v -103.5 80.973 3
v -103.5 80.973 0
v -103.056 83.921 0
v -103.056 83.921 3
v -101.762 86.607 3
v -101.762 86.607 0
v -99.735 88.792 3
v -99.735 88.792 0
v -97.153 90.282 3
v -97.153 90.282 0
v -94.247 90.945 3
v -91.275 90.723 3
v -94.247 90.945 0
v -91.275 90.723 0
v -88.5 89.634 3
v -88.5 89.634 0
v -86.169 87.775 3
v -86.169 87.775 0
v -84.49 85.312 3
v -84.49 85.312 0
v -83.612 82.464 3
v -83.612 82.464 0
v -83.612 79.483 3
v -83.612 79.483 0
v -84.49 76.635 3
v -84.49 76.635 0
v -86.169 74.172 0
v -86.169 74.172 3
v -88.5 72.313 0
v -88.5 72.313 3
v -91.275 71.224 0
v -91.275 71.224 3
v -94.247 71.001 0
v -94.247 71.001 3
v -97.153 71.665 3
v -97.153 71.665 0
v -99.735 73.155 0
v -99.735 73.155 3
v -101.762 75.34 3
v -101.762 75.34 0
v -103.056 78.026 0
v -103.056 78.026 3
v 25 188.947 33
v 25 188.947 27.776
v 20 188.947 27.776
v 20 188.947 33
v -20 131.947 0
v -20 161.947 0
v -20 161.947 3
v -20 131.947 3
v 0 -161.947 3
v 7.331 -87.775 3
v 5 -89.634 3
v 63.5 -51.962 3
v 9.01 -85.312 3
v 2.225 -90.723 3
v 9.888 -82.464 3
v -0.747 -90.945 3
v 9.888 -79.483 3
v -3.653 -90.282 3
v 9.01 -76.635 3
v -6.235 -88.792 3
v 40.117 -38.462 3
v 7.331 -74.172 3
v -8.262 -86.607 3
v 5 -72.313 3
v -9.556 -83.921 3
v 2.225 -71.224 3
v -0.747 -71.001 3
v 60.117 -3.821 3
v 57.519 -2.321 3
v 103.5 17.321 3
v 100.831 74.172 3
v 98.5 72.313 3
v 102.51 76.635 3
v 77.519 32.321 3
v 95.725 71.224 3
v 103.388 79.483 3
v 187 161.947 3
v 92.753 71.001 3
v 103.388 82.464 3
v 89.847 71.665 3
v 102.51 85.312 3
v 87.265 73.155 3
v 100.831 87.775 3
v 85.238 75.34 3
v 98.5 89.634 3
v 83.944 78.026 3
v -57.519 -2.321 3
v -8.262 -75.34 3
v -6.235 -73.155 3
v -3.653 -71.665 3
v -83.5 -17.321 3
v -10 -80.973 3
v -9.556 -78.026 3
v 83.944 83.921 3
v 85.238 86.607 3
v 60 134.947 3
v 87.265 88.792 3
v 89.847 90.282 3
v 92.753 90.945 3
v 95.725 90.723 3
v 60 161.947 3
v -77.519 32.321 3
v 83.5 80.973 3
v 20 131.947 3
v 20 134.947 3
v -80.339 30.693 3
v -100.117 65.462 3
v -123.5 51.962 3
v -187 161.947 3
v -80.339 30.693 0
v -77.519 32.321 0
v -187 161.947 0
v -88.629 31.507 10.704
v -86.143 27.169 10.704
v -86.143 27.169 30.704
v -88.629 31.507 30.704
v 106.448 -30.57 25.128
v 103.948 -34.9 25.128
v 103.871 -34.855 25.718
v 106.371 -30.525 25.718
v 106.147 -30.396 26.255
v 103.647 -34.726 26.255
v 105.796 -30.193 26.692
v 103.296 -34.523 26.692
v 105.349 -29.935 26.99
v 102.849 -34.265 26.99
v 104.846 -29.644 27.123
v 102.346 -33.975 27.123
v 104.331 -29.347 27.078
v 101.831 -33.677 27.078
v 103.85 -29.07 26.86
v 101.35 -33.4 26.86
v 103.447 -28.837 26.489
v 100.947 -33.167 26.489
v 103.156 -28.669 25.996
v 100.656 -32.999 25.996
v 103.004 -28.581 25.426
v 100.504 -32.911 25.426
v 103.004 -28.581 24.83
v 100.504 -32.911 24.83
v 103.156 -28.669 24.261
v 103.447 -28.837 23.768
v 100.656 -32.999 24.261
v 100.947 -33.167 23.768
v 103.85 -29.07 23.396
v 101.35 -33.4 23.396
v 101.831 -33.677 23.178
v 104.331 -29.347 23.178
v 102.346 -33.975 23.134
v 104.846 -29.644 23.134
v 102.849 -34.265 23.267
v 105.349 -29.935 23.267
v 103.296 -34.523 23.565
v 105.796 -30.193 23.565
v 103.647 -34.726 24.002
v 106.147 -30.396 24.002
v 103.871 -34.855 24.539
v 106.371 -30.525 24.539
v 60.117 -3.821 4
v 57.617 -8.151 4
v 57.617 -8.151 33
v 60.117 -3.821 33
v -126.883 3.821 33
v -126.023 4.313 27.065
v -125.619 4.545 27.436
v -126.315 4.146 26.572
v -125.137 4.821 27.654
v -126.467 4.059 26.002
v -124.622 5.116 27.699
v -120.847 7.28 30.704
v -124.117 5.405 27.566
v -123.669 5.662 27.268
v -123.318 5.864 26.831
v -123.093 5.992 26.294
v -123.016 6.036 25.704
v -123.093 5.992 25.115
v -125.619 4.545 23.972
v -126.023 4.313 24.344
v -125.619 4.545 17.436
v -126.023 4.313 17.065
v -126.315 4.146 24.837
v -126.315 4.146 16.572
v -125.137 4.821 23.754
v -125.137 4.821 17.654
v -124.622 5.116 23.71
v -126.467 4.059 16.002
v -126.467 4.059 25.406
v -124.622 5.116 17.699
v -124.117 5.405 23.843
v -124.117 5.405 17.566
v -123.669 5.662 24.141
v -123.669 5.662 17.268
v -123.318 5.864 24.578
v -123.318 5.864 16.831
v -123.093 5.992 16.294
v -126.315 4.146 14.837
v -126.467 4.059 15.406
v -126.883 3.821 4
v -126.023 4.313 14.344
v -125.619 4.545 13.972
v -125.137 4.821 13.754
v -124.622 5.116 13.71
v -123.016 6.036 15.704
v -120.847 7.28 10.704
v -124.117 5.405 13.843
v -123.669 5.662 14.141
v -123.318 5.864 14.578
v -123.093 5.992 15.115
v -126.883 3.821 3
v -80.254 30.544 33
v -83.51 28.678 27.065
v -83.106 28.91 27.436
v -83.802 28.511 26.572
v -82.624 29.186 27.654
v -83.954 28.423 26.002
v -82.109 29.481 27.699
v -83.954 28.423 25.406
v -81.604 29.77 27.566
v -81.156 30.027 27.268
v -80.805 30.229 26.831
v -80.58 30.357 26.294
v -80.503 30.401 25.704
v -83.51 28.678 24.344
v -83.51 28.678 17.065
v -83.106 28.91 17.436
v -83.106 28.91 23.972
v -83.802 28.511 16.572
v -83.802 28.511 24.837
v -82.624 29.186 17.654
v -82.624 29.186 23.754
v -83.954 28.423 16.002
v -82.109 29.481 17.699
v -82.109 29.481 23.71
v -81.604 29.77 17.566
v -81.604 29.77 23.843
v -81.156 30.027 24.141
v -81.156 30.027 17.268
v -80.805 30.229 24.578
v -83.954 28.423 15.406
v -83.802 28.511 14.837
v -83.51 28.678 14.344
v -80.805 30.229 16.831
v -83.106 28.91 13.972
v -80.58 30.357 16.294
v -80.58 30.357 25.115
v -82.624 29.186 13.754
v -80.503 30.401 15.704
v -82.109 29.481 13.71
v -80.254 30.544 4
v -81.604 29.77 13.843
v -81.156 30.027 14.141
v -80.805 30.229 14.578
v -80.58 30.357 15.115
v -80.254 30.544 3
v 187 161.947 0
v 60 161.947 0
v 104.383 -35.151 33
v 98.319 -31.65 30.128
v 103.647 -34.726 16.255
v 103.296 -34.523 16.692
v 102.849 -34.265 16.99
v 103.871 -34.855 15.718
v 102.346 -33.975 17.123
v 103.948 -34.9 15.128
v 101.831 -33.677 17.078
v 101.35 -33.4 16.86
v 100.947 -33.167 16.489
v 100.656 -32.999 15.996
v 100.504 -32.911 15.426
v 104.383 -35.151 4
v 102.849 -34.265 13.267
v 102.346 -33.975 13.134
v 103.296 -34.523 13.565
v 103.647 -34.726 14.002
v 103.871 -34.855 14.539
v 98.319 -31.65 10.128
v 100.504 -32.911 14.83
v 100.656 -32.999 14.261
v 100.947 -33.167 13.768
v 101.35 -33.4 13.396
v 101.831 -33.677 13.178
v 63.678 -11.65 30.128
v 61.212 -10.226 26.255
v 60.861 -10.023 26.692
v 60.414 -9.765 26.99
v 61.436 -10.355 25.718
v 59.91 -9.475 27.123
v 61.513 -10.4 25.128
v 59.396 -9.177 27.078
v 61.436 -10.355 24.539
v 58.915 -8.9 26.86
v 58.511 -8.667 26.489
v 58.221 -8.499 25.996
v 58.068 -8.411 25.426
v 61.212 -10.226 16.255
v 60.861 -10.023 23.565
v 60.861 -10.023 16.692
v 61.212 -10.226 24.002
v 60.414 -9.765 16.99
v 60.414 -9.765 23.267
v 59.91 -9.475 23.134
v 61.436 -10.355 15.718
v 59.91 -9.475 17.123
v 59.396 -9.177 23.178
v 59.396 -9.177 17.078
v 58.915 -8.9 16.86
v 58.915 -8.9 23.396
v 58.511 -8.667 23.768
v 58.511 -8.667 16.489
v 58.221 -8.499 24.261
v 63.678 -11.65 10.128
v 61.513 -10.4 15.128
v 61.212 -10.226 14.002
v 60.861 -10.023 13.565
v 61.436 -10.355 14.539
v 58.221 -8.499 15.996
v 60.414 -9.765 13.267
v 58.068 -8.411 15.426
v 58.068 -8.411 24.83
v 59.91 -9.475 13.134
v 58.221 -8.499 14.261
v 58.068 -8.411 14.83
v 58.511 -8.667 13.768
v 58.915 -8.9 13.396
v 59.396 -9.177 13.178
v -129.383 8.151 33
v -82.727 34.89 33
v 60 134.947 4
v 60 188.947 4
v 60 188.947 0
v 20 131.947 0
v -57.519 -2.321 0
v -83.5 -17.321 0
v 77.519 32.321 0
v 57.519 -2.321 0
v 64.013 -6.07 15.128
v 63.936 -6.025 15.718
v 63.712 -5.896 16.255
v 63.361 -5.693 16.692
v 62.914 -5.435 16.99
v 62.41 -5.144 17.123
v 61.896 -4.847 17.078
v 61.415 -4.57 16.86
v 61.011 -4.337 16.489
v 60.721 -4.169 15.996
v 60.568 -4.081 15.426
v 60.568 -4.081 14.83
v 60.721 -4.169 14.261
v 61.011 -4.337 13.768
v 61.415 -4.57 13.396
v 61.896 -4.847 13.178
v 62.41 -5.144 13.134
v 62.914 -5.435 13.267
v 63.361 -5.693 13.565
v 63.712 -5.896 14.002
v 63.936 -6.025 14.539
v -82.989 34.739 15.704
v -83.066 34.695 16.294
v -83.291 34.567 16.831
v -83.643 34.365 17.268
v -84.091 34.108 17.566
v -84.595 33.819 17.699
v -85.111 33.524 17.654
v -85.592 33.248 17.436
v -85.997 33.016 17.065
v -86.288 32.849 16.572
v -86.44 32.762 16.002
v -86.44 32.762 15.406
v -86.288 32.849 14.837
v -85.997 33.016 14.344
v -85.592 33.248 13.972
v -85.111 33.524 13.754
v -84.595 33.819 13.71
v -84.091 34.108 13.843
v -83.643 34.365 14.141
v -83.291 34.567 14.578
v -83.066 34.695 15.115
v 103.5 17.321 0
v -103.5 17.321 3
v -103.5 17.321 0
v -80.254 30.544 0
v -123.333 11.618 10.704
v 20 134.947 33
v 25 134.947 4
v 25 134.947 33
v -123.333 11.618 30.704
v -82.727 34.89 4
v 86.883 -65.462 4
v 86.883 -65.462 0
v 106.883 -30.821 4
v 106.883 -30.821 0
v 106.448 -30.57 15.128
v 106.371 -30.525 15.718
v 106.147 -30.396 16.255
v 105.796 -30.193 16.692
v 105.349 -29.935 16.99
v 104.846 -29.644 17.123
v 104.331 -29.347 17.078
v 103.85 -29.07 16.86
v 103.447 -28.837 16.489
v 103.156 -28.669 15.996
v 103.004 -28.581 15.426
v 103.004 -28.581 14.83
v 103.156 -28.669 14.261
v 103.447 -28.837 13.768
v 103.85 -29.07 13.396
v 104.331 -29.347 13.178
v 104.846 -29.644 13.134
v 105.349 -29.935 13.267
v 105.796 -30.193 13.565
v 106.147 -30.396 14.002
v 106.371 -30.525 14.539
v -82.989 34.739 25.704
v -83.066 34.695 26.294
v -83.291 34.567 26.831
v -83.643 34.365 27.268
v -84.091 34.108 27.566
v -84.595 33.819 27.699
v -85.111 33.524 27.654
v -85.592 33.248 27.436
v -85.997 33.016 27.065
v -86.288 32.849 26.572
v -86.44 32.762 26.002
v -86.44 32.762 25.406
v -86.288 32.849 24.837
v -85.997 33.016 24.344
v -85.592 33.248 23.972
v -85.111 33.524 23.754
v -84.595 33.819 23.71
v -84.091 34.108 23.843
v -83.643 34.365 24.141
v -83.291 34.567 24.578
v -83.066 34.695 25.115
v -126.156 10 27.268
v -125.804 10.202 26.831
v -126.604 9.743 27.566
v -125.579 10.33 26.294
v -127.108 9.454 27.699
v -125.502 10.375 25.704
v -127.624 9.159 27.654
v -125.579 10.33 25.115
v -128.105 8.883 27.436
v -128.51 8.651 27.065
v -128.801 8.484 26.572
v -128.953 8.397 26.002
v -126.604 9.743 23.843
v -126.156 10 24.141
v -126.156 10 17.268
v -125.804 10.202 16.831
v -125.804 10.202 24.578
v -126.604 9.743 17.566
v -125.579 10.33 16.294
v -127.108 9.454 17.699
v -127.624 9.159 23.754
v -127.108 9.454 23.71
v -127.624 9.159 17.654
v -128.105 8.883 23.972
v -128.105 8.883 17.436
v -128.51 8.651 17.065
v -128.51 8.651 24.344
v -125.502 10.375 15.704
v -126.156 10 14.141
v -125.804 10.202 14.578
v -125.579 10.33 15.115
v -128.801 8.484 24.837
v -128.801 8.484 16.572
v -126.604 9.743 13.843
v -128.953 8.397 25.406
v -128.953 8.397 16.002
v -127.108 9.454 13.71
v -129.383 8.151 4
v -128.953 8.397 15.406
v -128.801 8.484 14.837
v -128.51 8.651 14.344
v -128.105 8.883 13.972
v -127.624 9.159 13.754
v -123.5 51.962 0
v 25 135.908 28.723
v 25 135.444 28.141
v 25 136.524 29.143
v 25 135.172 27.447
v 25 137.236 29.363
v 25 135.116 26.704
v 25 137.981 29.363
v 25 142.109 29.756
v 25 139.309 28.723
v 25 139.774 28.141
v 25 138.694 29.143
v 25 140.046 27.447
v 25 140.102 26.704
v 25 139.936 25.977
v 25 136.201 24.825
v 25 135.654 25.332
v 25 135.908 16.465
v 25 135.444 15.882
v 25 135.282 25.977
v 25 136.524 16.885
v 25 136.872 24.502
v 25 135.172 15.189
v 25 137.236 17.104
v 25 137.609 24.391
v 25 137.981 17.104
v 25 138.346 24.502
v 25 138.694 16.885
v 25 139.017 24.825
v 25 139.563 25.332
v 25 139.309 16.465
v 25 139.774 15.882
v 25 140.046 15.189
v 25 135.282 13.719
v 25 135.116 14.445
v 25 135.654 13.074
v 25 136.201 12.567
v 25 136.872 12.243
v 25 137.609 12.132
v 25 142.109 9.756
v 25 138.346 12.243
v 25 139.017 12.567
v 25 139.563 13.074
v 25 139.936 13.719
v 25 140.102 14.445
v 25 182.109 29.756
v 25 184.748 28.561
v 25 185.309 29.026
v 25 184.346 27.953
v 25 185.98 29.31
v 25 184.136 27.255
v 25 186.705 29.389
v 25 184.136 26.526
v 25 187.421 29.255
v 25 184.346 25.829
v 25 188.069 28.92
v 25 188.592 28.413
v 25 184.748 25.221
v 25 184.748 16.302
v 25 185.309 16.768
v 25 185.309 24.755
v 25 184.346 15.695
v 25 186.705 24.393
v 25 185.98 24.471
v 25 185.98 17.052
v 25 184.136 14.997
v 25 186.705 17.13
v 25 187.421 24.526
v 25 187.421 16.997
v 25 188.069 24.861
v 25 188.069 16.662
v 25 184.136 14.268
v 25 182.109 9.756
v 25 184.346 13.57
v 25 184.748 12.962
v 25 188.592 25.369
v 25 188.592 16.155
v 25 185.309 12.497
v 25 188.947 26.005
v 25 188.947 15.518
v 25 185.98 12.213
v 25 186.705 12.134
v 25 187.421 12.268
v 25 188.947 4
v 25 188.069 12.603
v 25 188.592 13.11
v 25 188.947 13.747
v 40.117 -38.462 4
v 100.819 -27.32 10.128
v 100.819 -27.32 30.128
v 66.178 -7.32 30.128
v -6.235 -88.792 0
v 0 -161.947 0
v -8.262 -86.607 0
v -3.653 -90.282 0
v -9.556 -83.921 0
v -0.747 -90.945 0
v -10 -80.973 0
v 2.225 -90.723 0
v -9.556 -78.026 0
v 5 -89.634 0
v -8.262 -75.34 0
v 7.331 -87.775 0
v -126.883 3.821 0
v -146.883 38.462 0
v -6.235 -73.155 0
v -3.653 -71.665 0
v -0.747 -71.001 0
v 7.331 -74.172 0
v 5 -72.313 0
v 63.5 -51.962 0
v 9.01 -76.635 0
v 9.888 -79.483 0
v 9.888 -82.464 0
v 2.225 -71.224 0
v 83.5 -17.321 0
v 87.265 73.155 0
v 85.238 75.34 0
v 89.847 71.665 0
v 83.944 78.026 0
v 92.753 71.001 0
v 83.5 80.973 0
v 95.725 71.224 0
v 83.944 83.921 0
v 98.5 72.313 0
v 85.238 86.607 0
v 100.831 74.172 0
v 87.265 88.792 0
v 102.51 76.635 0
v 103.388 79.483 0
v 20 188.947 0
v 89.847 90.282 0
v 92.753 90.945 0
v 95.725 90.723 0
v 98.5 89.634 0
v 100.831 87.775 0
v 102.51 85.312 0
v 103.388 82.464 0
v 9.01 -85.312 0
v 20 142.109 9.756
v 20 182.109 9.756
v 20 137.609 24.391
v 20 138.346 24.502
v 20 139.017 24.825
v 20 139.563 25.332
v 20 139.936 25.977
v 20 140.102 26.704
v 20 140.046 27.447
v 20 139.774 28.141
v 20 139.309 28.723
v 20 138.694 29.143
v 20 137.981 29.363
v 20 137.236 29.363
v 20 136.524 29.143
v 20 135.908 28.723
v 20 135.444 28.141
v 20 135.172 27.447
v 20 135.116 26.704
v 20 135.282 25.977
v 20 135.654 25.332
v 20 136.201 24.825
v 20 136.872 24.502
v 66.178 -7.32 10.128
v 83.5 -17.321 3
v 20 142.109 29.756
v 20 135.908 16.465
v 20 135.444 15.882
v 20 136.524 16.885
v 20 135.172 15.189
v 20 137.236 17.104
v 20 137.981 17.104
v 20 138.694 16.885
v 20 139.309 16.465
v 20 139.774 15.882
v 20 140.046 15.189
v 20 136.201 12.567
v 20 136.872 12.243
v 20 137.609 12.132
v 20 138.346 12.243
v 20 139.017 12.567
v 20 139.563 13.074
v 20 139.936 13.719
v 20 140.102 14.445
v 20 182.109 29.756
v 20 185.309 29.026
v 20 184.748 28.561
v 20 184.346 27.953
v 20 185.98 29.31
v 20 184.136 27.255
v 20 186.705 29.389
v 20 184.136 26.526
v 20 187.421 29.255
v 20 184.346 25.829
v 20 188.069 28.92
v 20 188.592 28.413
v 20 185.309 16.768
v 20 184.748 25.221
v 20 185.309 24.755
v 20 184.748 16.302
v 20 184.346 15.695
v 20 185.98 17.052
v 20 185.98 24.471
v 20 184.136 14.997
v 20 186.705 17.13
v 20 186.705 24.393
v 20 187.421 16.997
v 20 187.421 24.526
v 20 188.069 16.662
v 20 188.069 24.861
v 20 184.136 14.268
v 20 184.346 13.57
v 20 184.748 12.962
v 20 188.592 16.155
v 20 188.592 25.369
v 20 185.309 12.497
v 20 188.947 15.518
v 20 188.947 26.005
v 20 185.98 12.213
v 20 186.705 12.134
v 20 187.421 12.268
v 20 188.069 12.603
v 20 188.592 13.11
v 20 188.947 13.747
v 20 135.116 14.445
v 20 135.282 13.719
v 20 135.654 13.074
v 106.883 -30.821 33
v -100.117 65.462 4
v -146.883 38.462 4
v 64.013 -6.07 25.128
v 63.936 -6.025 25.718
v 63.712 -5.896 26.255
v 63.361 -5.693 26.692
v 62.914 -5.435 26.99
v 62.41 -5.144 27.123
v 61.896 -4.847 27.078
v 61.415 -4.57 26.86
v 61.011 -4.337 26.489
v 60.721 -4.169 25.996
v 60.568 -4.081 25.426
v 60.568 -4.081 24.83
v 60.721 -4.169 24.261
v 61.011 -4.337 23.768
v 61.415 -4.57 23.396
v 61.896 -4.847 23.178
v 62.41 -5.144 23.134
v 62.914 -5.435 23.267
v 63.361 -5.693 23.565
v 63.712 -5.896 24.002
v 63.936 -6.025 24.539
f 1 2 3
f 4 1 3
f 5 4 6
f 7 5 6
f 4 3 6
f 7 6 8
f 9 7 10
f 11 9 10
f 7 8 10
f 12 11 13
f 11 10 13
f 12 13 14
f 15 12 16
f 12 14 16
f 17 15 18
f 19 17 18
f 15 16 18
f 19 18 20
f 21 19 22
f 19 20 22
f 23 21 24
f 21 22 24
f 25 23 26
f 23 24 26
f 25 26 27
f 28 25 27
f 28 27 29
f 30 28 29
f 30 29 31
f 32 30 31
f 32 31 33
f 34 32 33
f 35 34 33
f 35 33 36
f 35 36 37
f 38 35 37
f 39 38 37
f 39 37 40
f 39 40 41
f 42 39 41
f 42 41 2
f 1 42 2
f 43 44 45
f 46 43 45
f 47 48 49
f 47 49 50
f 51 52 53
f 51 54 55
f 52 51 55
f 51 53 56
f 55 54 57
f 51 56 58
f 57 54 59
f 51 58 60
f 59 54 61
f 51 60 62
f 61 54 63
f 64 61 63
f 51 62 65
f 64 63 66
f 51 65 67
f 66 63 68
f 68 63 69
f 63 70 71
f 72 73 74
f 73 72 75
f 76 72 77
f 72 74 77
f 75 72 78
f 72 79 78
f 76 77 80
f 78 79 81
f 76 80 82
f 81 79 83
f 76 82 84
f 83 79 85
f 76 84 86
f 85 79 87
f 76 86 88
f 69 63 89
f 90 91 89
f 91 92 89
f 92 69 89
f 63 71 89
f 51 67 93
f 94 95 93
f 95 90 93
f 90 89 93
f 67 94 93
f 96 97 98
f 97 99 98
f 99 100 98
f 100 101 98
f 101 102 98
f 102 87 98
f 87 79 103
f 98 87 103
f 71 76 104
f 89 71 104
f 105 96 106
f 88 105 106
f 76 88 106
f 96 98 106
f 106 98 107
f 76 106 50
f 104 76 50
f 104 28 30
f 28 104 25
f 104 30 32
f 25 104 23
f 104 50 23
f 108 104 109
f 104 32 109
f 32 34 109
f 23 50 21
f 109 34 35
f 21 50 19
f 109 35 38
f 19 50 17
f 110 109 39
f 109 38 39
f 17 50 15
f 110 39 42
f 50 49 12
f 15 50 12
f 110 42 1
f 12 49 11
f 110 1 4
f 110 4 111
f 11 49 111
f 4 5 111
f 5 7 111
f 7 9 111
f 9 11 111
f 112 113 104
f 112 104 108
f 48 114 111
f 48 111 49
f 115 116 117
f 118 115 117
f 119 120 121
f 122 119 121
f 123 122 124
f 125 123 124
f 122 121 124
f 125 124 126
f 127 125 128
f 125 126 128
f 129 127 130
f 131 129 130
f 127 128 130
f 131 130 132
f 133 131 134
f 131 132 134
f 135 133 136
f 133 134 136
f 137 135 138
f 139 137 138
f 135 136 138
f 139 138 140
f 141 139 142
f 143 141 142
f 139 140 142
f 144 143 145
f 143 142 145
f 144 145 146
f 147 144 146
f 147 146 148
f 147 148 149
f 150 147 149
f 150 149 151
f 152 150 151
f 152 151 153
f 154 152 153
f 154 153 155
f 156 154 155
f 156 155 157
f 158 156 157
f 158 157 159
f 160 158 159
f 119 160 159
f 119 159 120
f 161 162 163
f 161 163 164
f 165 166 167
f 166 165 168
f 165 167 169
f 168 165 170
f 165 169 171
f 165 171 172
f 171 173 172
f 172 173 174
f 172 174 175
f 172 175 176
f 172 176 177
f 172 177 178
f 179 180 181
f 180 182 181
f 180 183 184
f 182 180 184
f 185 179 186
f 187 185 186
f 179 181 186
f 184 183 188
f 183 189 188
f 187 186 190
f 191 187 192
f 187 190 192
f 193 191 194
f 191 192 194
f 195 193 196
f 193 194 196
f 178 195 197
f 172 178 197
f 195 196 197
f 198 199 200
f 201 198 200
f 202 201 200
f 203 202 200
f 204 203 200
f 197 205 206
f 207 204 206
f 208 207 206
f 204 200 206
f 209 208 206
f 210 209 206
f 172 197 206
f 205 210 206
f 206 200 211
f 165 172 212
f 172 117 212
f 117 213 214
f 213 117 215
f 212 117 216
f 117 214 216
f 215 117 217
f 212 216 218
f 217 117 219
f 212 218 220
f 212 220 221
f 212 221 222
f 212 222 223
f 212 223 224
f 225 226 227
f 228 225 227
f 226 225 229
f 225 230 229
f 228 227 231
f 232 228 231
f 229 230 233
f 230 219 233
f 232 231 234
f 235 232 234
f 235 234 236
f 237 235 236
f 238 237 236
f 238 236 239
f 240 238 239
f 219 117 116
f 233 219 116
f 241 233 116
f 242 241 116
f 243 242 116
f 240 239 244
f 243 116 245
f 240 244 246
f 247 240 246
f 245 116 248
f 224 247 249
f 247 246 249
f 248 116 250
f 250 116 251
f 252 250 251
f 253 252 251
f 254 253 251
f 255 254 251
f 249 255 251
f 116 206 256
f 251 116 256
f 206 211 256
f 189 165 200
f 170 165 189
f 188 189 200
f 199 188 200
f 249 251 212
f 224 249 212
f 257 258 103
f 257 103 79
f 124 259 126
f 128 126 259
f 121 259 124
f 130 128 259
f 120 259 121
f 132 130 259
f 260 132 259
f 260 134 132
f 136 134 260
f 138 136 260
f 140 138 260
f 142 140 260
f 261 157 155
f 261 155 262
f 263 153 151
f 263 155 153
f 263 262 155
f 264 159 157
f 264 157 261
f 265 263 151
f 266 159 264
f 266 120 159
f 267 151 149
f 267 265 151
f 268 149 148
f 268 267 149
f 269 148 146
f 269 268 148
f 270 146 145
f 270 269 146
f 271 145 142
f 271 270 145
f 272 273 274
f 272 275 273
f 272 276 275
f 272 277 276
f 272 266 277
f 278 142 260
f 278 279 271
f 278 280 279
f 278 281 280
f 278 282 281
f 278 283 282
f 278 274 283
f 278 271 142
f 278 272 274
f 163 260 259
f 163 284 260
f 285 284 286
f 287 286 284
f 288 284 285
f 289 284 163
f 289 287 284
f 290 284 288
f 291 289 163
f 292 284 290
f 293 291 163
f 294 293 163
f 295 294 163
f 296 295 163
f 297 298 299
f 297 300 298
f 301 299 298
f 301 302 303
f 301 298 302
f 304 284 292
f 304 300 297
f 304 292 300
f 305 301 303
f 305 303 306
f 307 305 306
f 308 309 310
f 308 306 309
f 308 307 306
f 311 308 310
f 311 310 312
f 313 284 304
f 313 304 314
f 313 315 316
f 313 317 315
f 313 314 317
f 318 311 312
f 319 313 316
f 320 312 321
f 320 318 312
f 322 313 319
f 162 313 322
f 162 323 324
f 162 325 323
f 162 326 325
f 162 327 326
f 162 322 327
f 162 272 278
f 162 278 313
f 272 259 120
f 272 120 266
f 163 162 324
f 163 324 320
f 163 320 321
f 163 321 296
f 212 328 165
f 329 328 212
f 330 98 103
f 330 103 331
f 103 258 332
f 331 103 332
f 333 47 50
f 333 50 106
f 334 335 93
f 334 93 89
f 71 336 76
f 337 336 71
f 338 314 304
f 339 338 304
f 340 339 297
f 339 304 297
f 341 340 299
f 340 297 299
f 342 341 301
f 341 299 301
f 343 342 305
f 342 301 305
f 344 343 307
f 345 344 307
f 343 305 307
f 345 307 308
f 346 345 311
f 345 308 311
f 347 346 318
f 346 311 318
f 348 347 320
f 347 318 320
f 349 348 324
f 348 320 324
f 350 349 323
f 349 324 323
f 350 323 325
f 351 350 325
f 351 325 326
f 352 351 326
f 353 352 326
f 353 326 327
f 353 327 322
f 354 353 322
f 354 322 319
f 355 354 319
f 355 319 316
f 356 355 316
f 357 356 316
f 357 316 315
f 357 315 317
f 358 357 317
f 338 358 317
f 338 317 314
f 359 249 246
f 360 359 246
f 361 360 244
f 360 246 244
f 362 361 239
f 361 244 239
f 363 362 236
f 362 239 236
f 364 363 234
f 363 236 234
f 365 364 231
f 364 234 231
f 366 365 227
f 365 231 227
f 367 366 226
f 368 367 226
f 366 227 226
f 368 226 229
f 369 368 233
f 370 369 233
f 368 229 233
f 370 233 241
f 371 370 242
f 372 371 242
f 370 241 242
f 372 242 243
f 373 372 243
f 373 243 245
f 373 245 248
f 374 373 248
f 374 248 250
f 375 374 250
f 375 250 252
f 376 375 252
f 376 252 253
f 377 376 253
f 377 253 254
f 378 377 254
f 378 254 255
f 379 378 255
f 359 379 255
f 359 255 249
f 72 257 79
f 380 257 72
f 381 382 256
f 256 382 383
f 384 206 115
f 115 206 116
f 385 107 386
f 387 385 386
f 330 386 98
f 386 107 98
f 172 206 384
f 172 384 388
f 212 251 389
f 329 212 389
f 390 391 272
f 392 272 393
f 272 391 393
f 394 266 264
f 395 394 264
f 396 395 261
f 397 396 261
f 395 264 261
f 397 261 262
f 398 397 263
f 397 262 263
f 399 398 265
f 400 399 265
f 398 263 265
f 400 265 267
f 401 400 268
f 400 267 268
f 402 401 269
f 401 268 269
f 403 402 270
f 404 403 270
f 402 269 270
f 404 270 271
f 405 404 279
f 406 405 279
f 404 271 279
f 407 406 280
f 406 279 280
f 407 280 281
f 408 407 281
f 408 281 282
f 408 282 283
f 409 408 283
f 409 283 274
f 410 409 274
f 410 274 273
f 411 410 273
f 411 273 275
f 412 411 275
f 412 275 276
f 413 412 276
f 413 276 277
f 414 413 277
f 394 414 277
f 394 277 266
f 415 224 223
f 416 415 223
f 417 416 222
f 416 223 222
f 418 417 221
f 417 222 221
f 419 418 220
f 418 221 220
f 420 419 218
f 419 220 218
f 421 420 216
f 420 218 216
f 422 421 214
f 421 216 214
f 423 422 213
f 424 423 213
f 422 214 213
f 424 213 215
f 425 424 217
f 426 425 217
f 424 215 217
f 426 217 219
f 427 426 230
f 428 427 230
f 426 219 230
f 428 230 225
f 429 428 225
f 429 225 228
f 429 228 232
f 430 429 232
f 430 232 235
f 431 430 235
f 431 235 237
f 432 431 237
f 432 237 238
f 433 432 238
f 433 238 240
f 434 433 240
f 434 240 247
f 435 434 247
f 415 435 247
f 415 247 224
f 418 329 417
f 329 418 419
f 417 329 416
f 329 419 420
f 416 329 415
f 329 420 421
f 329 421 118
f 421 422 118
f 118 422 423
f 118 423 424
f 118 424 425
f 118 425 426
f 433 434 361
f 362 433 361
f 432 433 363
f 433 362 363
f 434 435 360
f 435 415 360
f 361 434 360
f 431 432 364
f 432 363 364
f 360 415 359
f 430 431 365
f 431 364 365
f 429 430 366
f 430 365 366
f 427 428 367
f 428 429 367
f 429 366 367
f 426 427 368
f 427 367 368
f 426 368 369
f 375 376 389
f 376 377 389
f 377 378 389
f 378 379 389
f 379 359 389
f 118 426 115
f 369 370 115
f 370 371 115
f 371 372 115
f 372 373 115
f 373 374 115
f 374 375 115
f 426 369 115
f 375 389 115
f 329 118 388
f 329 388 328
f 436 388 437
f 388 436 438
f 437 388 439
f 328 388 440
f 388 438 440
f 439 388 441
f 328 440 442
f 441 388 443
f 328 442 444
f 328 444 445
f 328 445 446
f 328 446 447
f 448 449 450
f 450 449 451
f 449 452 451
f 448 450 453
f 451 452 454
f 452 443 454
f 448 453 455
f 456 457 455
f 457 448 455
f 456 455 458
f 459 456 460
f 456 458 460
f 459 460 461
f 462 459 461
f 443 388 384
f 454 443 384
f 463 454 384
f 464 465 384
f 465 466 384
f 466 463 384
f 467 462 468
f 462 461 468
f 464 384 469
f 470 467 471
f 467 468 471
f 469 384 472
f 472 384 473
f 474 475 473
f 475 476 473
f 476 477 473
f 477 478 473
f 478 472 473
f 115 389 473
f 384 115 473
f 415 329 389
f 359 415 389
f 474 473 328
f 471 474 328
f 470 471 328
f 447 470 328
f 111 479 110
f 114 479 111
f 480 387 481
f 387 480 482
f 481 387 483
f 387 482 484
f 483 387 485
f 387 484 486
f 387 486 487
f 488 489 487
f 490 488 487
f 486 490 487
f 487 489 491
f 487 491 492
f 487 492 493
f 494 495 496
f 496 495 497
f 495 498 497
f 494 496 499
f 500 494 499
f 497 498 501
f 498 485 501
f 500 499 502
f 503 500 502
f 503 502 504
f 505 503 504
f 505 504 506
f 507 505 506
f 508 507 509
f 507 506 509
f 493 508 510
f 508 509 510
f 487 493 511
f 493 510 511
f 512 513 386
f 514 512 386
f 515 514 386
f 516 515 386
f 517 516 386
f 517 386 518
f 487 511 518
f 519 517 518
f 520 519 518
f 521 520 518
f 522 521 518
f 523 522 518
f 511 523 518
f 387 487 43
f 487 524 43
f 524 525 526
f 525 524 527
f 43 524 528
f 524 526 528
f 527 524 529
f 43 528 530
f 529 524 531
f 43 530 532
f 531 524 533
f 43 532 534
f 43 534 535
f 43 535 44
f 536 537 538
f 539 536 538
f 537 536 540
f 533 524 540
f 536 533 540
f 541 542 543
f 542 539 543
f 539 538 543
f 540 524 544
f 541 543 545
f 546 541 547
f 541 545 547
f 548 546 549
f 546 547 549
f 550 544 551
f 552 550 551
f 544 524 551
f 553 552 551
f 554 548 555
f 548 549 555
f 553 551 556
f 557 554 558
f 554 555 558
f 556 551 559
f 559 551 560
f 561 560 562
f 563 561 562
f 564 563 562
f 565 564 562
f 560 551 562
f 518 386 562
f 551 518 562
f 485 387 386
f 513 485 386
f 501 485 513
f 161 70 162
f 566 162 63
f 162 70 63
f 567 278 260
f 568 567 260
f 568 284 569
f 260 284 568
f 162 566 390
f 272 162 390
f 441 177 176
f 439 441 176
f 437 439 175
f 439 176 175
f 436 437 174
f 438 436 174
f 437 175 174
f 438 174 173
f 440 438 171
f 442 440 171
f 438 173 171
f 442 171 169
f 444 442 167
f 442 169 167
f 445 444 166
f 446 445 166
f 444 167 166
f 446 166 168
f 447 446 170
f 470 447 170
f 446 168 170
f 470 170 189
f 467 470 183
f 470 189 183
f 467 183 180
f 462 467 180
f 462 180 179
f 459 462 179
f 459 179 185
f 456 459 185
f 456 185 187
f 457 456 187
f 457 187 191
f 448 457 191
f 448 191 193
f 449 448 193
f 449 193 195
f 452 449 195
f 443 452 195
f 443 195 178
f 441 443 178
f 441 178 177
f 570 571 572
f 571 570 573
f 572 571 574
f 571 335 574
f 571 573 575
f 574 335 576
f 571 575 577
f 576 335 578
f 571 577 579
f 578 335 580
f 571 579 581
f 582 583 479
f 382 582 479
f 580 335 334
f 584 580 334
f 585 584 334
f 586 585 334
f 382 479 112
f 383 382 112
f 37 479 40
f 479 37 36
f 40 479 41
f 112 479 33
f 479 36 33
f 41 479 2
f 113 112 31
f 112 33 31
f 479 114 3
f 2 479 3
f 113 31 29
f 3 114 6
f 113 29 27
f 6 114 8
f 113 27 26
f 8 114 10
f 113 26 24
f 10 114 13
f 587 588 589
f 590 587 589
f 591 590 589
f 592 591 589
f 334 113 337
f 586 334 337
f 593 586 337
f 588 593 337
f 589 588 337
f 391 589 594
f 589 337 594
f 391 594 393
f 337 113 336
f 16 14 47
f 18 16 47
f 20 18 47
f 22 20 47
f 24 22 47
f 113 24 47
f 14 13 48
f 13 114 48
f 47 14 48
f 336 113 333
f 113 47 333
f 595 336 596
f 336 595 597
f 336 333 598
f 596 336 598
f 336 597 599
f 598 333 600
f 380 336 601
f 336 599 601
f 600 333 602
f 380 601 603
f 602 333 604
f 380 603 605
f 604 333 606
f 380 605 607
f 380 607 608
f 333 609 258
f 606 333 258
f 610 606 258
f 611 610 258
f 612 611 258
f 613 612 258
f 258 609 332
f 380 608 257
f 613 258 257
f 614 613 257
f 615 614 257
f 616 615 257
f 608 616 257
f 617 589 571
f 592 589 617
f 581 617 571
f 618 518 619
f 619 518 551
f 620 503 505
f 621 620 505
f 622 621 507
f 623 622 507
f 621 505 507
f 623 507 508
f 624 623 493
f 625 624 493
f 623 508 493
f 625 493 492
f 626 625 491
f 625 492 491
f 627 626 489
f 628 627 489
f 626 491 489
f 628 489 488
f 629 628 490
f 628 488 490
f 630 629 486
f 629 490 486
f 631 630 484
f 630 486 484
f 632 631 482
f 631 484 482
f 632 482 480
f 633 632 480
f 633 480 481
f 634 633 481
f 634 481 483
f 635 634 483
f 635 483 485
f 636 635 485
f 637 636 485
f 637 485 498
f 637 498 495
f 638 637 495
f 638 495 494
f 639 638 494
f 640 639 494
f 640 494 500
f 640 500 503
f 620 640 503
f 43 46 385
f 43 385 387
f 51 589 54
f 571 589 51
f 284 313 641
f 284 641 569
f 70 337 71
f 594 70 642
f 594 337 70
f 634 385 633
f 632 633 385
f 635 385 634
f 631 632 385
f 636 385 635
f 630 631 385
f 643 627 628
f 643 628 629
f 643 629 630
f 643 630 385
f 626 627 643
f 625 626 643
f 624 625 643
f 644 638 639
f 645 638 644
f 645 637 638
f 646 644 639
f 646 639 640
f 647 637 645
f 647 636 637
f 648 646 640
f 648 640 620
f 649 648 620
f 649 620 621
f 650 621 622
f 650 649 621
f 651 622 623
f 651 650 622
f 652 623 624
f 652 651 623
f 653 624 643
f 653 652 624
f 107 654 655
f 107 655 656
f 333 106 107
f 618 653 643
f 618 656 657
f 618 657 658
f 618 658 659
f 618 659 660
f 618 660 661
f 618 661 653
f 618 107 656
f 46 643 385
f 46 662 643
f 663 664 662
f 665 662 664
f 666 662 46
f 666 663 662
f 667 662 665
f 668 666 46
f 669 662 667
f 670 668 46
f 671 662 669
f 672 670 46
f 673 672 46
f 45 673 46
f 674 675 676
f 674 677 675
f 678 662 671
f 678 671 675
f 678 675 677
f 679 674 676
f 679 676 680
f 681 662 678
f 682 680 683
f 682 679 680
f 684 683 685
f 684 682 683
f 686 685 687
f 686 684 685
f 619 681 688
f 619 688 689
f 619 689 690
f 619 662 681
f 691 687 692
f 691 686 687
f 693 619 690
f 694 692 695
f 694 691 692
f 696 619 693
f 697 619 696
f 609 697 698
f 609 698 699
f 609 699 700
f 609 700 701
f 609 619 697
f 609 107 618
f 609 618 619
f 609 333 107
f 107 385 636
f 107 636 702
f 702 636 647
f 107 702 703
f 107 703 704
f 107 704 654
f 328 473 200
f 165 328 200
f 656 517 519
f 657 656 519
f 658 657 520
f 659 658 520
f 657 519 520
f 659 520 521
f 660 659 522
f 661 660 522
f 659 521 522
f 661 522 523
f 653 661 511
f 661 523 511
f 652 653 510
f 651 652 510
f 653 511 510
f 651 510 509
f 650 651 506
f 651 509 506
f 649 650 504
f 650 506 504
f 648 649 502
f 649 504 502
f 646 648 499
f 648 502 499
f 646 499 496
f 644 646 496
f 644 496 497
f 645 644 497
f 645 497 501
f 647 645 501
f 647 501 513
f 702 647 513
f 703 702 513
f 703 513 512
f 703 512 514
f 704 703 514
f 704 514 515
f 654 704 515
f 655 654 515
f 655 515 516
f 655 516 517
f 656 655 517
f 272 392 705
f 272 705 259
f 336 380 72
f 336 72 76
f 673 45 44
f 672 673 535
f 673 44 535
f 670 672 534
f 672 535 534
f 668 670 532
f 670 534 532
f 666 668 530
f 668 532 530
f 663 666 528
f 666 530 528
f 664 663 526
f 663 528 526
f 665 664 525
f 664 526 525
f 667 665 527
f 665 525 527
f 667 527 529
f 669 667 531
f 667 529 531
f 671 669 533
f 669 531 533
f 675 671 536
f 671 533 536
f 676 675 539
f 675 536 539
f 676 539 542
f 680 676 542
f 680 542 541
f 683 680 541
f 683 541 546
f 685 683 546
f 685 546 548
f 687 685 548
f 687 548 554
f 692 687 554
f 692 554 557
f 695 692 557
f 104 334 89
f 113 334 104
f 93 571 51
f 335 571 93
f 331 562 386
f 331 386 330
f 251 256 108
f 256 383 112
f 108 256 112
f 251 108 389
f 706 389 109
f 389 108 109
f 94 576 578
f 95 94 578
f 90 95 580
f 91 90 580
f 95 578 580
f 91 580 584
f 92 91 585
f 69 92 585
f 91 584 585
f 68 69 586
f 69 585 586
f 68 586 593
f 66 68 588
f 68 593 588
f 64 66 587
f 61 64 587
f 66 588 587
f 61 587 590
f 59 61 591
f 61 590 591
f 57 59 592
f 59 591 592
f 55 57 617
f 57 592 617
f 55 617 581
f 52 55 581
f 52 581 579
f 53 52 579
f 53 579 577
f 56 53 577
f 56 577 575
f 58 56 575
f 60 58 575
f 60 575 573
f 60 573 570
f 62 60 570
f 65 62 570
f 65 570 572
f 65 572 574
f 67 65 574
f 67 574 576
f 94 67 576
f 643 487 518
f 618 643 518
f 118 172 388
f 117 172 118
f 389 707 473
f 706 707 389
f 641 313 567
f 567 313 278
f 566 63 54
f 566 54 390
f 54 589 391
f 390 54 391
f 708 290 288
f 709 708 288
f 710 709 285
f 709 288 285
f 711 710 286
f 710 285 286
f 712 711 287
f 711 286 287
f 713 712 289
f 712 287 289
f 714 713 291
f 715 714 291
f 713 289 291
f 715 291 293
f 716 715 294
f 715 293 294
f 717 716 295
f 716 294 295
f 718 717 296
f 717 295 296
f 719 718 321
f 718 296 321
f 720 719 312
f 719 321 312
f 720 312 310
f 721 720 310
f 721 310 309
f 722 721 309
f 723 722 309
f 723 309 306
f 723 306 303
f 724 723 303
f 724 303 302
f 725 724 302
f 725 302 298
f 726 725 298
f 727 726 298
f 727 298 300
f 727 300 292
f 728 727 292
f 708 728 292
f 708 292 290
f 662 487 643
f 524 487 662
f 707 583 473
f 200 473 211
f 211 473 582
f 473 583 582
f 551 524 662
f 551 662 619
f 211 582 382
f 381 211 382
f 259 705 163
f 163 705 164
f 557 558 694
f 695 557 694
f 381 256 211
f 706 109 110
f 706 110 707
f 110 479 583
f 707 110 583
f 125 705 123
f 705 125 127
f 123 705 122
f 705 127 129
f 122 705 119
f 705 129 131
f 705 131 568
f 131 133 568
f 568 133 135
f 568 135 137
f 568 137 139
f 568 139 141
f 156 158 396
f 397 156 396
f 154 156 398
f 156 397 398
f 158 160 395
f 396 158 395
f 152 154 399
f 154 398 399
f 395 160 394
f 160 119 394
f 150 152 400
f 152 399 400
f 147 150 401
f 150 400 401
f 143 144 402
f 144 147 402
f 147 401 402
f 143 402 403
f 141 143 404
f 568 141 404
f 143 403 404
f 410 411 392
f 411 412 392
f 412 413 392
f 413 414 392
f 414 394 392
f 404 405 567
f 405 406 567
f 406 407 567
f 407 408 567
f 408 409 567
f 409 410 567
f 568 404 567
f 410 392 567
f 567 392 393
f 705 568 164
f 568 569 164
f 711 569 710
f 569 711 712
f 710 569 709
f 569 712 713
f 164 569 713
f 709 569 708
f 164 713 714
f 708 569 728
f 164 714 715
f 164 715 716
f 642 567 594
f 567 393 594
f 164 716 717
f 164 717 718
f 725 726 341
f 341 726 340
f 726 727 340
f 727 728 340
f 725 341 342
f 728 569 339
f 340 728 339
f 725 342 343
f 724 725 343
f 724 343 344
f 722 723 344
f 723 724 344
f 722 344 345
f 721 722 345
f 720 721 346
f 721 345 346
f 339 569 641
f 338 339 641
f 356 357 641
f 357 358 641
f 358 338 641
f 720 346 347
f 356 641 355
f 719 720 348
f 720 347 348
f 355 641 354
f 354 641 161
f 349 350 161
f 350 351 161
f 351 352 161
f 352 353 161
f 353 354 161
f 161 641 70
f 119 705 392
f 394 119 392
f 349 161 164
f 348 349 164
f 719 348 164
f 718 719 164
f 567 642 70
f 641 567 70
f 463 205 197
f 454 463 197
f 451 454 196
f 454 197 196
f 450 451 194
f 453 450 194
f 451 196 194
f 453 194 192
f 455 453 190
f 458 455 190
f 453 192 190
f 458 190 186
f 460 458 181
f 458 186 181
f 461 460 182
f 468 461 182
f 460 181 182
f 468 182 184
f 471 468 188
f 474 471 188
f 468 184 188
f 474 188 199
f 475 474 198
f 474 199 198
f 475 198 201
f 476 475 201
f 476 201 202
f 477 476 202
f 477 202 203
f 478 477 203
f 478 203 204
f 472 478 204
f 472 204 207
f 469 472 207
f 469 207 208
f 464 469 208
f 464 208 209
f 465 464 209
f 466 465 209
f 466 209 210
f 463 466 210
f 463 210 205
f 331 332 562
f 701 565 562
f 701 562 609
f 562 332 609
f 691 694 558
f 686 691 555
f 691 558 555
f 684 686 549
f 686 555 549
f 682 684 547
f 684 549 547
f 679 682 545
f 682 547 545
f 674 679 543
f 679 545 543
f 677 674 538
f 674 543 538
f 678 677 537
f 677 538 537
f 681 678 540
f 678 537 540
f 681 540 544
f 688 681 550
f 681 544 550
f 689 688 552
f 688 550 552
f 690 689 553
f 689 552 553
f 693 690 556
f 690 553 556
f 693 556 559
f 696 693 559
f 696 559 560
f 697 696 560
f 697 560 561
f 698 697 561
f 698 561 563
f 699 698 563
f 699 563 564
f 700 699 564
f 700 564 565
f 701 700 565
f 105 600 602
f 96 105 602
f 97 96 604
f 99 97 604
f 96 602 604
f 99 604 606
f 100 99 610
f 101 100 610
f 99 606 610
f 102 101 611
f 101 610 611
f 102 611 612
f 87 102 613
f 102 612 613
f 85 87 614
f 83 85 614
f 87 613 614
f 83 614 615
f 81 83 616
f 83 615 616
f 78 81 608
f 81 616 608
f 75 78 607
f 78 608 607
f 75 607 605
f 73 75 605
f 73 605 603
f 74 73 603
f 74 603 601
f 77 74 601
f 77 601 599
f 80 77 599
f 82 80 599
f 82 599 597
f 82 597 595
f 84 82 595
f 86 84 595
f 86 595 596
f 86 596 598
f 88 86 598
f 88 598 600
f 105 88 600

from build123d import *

# Parameters (mm, degrees)
BOSS_EXTRUDE1_DEPTH = 3
CUT_EXTRUDE2_DEPTH  = 10
CUT_EXTRUDE3_DEPTH  = 10
BOSS_EXTRUDE2_DEPTH = 4
SKETCH6_W           = 5
SKETCH6_H           = 54
BOSS_EXTRUDE3_DEPTH = 30
SKETCH8_R           = 2
SKETCH8_W           = 40
SKETCH8_H           = 20
CUT_EXTRUDE4_DEPTH  = 40
SKETCH9_R           = 2
SKETCH9_W           = 40
SKETCH9_H           = 20
CUT_EXTRUDE5_DEPTH  = 40
SKETCH13_R          = 2.5
SKETCH13_W          = 20
SKETCH13_H          = 40
CUT_EXTRUDE6_DEPTH  = 40
SKETCH14_R          = 10
CUT_EXTRUDE7_DEPTH  = 10


with BuildPart() as part:
    # Sketch2 → Boss-Extrude1 (new body)
    with BuildSketch(Plane.XY):
        Polygon((-187, 161.946750508), (187, 161.946750508), (0, -161.946750508), align=None)
    extrude(amount=BOSS_EXTRUDE1_DEPTH)

    # Sketch3 → Cut-Extrude2 (cut)
    with BuildSketch(Plane.XY):
        Polygon((-83.5, -17.320508076), (-57.519237886, -2.320508076), (-77.519237886, 32.320508076), (-103.5, 17.320508076), align=None)
        Polygon((57.519237886, -2.320508076), (83.5, -17.320508076), (103.5, 17.320508076), (77.519237886, 32.320508076), align=None)
    extrude(amount=CUT_EXTRUDE2_DEPTH, mode=Mode.SUBTRACT)

    # Sketch4 → Cut-Extrude3 (cut)
    with BuildSketch(Plane.XY):
        Polygon((0, 131.946750508), (20, 131.946750508), (20, 161.946750508), (0, 161.946750508), (-20, 161.946750508), (-20, 131.946750508), align=None)
    extrude(amount=CUT_EXTRUDE3_DEPTH, mode=Mode.SUBTRACT)

    # Sketch5 → Boss-Extrude2 (add)
    with BuildSketch(Plane.XY):
        Polygon((-103.5, 17.320508076), (-80.25426683, 30.543976819), (-100.117314098, 65.461524227), (-123.5, 51.961524227), (-146.882685902, 38.461524227), (-126.882685902, 3.820508076), align=None)
        Polygon((20, 161.946750508), (20, 134.946750508), (60, 134.946750508), (60, 161.946750508), (60, 188.946750508), (20, 188.946750508), align=None)
        Polygon((83.5, -17.320508076), (60.117314098, -3.820508076), (40.117314098, -38.461524227), (63.5, -51.961524227), (86.882685902, -65.461524227), (106.882685902, -30.820508076), align=None)
    extrude(amount=BOSS_EXTRUDE2_DEPTH)

    # Sketch6 → Boss-Extrude3 (add)
    with BuildSketch(Plane.XY.offset(3)):
        Polygon((-126.882685902, 3.820508076), (-80.25426683, 30.543976819), (-82.726527648, 34.89000103), (-129.382685902, 8.150635095), align=None)
        Polygon((60.117314098, -3.820508076), (106.882685902, -30.820508076), (104.382685902, -35.150635095), (57.617314098, -8.150635095), align=None)
        with Locations((22.5, 161.946750508)):
            Rectangle(SKETCH6_W, SKETCH6_H)
    extrude(amount=BOSS_EXTRUDE3_DEPTH)

    # Sketch8 → Cut-Extrude4 (cut)
    with BuildSketch(Plane(origin=(-33.019892419, 57.614727947, 0), x_dir=(0.867611975, 0.497241853, 0), z_dir=(0.497241853, -0.867611975, 0))):
        with Locations((-56.728666482, 15.70430261)):
            Circle(SKETCH8_R)
        with Locations((-56.728666482, 25.70430261)):
            Circle(SKETCH8_R)
        with Locations((-105.728666482, 25.70430261)):
            Circle(SKETCH8_R)
        with Locations((-105.728666482, 15.70430261)):
            Circle(SKETCH8_R)
        with Locations((-81.228666482, 20.70430261)):
            Rectangle(SKETCH8_W, SKETCH8_H)
    extrude(amount=-CUT_EXTRUDE4_DEPTH, mode=Mode.SUBTRACT)

    # Sketch9 → Cut-Extrude5 (cut)
    with BuildSketch(Plane(origin=(10.875, 18.836052532, 0), x_dir=(0.866025404, -0.5, 0), z_dir=(-0.5, -0.866025404, 0))):
        with Locations((105.471828454, 15.12829127)):
            Circle(SKETCH9_R)
        with Locations((105.471828454, 25.12829127)):
            Circle(SKETCH9_R)
        with Locations((56.471828454, 25.12829127)):
            Circle(SKETCH9_R)
        with Locations((56.471828454, 15.12829127)):
            Circle(SKETCH9_R)
        with Locations((80.971828454, 20.12829127)):
            Rectangle(SKETCH9_W, SKETCH9_H)
    extrude(amount=-CUT_EXTRUDE5_DEPTH, mode=Mode.SUBTRACT)

    # Sketch13 → Cut-Extrude6 (cut)
    with BuildSketch(Plane(origin=(25, 0, 0), x_dir=(0, 0, -1), z_dir=(1, 0, 0))):
        with Locations((-26.890806587, 137.608868151)):
            Circle(SKETCH13_R)
        with Locations((-14.632269725, 137.608868151)):
            Circle(SKETCH13_R)
        with Locations((-26.890806587, 186.608868151)):
            Circle(SKETCH13_R)
        with Locations((-14.632269725, 186.608868151)):
            Circle(SKETCH13_R)
        with Locations((-19.755862456, 162.108868151)):
            Rectangle(SKETCH13_W, SKETCH13_H)
    extrude(amount=-CUT_EXTRUDE6_DEPTH, mode=Mode.SUBTRACT)

    # Sketch14 → Cut-Extrude7 (cut)
    with BuildSketch(Plane(origin=(0, 0, 0), x_dir=(-1, 0, 0), z_dir=(0, 0, -1))):
        with Locations((0, -80.973375254)):
            Circle(SKETCH14_R)
        with Locations((93.5, 80.973375254)):
            Circle(SKETCH14_R)
        with Locations((-93.5, 80.973375254)):
            Circle(SKETCH14_R)
    extrude(amount=-CUT_EXTRUDE7_DEPTH, mode=Mode.SUBTRACT)


solid = part.part
